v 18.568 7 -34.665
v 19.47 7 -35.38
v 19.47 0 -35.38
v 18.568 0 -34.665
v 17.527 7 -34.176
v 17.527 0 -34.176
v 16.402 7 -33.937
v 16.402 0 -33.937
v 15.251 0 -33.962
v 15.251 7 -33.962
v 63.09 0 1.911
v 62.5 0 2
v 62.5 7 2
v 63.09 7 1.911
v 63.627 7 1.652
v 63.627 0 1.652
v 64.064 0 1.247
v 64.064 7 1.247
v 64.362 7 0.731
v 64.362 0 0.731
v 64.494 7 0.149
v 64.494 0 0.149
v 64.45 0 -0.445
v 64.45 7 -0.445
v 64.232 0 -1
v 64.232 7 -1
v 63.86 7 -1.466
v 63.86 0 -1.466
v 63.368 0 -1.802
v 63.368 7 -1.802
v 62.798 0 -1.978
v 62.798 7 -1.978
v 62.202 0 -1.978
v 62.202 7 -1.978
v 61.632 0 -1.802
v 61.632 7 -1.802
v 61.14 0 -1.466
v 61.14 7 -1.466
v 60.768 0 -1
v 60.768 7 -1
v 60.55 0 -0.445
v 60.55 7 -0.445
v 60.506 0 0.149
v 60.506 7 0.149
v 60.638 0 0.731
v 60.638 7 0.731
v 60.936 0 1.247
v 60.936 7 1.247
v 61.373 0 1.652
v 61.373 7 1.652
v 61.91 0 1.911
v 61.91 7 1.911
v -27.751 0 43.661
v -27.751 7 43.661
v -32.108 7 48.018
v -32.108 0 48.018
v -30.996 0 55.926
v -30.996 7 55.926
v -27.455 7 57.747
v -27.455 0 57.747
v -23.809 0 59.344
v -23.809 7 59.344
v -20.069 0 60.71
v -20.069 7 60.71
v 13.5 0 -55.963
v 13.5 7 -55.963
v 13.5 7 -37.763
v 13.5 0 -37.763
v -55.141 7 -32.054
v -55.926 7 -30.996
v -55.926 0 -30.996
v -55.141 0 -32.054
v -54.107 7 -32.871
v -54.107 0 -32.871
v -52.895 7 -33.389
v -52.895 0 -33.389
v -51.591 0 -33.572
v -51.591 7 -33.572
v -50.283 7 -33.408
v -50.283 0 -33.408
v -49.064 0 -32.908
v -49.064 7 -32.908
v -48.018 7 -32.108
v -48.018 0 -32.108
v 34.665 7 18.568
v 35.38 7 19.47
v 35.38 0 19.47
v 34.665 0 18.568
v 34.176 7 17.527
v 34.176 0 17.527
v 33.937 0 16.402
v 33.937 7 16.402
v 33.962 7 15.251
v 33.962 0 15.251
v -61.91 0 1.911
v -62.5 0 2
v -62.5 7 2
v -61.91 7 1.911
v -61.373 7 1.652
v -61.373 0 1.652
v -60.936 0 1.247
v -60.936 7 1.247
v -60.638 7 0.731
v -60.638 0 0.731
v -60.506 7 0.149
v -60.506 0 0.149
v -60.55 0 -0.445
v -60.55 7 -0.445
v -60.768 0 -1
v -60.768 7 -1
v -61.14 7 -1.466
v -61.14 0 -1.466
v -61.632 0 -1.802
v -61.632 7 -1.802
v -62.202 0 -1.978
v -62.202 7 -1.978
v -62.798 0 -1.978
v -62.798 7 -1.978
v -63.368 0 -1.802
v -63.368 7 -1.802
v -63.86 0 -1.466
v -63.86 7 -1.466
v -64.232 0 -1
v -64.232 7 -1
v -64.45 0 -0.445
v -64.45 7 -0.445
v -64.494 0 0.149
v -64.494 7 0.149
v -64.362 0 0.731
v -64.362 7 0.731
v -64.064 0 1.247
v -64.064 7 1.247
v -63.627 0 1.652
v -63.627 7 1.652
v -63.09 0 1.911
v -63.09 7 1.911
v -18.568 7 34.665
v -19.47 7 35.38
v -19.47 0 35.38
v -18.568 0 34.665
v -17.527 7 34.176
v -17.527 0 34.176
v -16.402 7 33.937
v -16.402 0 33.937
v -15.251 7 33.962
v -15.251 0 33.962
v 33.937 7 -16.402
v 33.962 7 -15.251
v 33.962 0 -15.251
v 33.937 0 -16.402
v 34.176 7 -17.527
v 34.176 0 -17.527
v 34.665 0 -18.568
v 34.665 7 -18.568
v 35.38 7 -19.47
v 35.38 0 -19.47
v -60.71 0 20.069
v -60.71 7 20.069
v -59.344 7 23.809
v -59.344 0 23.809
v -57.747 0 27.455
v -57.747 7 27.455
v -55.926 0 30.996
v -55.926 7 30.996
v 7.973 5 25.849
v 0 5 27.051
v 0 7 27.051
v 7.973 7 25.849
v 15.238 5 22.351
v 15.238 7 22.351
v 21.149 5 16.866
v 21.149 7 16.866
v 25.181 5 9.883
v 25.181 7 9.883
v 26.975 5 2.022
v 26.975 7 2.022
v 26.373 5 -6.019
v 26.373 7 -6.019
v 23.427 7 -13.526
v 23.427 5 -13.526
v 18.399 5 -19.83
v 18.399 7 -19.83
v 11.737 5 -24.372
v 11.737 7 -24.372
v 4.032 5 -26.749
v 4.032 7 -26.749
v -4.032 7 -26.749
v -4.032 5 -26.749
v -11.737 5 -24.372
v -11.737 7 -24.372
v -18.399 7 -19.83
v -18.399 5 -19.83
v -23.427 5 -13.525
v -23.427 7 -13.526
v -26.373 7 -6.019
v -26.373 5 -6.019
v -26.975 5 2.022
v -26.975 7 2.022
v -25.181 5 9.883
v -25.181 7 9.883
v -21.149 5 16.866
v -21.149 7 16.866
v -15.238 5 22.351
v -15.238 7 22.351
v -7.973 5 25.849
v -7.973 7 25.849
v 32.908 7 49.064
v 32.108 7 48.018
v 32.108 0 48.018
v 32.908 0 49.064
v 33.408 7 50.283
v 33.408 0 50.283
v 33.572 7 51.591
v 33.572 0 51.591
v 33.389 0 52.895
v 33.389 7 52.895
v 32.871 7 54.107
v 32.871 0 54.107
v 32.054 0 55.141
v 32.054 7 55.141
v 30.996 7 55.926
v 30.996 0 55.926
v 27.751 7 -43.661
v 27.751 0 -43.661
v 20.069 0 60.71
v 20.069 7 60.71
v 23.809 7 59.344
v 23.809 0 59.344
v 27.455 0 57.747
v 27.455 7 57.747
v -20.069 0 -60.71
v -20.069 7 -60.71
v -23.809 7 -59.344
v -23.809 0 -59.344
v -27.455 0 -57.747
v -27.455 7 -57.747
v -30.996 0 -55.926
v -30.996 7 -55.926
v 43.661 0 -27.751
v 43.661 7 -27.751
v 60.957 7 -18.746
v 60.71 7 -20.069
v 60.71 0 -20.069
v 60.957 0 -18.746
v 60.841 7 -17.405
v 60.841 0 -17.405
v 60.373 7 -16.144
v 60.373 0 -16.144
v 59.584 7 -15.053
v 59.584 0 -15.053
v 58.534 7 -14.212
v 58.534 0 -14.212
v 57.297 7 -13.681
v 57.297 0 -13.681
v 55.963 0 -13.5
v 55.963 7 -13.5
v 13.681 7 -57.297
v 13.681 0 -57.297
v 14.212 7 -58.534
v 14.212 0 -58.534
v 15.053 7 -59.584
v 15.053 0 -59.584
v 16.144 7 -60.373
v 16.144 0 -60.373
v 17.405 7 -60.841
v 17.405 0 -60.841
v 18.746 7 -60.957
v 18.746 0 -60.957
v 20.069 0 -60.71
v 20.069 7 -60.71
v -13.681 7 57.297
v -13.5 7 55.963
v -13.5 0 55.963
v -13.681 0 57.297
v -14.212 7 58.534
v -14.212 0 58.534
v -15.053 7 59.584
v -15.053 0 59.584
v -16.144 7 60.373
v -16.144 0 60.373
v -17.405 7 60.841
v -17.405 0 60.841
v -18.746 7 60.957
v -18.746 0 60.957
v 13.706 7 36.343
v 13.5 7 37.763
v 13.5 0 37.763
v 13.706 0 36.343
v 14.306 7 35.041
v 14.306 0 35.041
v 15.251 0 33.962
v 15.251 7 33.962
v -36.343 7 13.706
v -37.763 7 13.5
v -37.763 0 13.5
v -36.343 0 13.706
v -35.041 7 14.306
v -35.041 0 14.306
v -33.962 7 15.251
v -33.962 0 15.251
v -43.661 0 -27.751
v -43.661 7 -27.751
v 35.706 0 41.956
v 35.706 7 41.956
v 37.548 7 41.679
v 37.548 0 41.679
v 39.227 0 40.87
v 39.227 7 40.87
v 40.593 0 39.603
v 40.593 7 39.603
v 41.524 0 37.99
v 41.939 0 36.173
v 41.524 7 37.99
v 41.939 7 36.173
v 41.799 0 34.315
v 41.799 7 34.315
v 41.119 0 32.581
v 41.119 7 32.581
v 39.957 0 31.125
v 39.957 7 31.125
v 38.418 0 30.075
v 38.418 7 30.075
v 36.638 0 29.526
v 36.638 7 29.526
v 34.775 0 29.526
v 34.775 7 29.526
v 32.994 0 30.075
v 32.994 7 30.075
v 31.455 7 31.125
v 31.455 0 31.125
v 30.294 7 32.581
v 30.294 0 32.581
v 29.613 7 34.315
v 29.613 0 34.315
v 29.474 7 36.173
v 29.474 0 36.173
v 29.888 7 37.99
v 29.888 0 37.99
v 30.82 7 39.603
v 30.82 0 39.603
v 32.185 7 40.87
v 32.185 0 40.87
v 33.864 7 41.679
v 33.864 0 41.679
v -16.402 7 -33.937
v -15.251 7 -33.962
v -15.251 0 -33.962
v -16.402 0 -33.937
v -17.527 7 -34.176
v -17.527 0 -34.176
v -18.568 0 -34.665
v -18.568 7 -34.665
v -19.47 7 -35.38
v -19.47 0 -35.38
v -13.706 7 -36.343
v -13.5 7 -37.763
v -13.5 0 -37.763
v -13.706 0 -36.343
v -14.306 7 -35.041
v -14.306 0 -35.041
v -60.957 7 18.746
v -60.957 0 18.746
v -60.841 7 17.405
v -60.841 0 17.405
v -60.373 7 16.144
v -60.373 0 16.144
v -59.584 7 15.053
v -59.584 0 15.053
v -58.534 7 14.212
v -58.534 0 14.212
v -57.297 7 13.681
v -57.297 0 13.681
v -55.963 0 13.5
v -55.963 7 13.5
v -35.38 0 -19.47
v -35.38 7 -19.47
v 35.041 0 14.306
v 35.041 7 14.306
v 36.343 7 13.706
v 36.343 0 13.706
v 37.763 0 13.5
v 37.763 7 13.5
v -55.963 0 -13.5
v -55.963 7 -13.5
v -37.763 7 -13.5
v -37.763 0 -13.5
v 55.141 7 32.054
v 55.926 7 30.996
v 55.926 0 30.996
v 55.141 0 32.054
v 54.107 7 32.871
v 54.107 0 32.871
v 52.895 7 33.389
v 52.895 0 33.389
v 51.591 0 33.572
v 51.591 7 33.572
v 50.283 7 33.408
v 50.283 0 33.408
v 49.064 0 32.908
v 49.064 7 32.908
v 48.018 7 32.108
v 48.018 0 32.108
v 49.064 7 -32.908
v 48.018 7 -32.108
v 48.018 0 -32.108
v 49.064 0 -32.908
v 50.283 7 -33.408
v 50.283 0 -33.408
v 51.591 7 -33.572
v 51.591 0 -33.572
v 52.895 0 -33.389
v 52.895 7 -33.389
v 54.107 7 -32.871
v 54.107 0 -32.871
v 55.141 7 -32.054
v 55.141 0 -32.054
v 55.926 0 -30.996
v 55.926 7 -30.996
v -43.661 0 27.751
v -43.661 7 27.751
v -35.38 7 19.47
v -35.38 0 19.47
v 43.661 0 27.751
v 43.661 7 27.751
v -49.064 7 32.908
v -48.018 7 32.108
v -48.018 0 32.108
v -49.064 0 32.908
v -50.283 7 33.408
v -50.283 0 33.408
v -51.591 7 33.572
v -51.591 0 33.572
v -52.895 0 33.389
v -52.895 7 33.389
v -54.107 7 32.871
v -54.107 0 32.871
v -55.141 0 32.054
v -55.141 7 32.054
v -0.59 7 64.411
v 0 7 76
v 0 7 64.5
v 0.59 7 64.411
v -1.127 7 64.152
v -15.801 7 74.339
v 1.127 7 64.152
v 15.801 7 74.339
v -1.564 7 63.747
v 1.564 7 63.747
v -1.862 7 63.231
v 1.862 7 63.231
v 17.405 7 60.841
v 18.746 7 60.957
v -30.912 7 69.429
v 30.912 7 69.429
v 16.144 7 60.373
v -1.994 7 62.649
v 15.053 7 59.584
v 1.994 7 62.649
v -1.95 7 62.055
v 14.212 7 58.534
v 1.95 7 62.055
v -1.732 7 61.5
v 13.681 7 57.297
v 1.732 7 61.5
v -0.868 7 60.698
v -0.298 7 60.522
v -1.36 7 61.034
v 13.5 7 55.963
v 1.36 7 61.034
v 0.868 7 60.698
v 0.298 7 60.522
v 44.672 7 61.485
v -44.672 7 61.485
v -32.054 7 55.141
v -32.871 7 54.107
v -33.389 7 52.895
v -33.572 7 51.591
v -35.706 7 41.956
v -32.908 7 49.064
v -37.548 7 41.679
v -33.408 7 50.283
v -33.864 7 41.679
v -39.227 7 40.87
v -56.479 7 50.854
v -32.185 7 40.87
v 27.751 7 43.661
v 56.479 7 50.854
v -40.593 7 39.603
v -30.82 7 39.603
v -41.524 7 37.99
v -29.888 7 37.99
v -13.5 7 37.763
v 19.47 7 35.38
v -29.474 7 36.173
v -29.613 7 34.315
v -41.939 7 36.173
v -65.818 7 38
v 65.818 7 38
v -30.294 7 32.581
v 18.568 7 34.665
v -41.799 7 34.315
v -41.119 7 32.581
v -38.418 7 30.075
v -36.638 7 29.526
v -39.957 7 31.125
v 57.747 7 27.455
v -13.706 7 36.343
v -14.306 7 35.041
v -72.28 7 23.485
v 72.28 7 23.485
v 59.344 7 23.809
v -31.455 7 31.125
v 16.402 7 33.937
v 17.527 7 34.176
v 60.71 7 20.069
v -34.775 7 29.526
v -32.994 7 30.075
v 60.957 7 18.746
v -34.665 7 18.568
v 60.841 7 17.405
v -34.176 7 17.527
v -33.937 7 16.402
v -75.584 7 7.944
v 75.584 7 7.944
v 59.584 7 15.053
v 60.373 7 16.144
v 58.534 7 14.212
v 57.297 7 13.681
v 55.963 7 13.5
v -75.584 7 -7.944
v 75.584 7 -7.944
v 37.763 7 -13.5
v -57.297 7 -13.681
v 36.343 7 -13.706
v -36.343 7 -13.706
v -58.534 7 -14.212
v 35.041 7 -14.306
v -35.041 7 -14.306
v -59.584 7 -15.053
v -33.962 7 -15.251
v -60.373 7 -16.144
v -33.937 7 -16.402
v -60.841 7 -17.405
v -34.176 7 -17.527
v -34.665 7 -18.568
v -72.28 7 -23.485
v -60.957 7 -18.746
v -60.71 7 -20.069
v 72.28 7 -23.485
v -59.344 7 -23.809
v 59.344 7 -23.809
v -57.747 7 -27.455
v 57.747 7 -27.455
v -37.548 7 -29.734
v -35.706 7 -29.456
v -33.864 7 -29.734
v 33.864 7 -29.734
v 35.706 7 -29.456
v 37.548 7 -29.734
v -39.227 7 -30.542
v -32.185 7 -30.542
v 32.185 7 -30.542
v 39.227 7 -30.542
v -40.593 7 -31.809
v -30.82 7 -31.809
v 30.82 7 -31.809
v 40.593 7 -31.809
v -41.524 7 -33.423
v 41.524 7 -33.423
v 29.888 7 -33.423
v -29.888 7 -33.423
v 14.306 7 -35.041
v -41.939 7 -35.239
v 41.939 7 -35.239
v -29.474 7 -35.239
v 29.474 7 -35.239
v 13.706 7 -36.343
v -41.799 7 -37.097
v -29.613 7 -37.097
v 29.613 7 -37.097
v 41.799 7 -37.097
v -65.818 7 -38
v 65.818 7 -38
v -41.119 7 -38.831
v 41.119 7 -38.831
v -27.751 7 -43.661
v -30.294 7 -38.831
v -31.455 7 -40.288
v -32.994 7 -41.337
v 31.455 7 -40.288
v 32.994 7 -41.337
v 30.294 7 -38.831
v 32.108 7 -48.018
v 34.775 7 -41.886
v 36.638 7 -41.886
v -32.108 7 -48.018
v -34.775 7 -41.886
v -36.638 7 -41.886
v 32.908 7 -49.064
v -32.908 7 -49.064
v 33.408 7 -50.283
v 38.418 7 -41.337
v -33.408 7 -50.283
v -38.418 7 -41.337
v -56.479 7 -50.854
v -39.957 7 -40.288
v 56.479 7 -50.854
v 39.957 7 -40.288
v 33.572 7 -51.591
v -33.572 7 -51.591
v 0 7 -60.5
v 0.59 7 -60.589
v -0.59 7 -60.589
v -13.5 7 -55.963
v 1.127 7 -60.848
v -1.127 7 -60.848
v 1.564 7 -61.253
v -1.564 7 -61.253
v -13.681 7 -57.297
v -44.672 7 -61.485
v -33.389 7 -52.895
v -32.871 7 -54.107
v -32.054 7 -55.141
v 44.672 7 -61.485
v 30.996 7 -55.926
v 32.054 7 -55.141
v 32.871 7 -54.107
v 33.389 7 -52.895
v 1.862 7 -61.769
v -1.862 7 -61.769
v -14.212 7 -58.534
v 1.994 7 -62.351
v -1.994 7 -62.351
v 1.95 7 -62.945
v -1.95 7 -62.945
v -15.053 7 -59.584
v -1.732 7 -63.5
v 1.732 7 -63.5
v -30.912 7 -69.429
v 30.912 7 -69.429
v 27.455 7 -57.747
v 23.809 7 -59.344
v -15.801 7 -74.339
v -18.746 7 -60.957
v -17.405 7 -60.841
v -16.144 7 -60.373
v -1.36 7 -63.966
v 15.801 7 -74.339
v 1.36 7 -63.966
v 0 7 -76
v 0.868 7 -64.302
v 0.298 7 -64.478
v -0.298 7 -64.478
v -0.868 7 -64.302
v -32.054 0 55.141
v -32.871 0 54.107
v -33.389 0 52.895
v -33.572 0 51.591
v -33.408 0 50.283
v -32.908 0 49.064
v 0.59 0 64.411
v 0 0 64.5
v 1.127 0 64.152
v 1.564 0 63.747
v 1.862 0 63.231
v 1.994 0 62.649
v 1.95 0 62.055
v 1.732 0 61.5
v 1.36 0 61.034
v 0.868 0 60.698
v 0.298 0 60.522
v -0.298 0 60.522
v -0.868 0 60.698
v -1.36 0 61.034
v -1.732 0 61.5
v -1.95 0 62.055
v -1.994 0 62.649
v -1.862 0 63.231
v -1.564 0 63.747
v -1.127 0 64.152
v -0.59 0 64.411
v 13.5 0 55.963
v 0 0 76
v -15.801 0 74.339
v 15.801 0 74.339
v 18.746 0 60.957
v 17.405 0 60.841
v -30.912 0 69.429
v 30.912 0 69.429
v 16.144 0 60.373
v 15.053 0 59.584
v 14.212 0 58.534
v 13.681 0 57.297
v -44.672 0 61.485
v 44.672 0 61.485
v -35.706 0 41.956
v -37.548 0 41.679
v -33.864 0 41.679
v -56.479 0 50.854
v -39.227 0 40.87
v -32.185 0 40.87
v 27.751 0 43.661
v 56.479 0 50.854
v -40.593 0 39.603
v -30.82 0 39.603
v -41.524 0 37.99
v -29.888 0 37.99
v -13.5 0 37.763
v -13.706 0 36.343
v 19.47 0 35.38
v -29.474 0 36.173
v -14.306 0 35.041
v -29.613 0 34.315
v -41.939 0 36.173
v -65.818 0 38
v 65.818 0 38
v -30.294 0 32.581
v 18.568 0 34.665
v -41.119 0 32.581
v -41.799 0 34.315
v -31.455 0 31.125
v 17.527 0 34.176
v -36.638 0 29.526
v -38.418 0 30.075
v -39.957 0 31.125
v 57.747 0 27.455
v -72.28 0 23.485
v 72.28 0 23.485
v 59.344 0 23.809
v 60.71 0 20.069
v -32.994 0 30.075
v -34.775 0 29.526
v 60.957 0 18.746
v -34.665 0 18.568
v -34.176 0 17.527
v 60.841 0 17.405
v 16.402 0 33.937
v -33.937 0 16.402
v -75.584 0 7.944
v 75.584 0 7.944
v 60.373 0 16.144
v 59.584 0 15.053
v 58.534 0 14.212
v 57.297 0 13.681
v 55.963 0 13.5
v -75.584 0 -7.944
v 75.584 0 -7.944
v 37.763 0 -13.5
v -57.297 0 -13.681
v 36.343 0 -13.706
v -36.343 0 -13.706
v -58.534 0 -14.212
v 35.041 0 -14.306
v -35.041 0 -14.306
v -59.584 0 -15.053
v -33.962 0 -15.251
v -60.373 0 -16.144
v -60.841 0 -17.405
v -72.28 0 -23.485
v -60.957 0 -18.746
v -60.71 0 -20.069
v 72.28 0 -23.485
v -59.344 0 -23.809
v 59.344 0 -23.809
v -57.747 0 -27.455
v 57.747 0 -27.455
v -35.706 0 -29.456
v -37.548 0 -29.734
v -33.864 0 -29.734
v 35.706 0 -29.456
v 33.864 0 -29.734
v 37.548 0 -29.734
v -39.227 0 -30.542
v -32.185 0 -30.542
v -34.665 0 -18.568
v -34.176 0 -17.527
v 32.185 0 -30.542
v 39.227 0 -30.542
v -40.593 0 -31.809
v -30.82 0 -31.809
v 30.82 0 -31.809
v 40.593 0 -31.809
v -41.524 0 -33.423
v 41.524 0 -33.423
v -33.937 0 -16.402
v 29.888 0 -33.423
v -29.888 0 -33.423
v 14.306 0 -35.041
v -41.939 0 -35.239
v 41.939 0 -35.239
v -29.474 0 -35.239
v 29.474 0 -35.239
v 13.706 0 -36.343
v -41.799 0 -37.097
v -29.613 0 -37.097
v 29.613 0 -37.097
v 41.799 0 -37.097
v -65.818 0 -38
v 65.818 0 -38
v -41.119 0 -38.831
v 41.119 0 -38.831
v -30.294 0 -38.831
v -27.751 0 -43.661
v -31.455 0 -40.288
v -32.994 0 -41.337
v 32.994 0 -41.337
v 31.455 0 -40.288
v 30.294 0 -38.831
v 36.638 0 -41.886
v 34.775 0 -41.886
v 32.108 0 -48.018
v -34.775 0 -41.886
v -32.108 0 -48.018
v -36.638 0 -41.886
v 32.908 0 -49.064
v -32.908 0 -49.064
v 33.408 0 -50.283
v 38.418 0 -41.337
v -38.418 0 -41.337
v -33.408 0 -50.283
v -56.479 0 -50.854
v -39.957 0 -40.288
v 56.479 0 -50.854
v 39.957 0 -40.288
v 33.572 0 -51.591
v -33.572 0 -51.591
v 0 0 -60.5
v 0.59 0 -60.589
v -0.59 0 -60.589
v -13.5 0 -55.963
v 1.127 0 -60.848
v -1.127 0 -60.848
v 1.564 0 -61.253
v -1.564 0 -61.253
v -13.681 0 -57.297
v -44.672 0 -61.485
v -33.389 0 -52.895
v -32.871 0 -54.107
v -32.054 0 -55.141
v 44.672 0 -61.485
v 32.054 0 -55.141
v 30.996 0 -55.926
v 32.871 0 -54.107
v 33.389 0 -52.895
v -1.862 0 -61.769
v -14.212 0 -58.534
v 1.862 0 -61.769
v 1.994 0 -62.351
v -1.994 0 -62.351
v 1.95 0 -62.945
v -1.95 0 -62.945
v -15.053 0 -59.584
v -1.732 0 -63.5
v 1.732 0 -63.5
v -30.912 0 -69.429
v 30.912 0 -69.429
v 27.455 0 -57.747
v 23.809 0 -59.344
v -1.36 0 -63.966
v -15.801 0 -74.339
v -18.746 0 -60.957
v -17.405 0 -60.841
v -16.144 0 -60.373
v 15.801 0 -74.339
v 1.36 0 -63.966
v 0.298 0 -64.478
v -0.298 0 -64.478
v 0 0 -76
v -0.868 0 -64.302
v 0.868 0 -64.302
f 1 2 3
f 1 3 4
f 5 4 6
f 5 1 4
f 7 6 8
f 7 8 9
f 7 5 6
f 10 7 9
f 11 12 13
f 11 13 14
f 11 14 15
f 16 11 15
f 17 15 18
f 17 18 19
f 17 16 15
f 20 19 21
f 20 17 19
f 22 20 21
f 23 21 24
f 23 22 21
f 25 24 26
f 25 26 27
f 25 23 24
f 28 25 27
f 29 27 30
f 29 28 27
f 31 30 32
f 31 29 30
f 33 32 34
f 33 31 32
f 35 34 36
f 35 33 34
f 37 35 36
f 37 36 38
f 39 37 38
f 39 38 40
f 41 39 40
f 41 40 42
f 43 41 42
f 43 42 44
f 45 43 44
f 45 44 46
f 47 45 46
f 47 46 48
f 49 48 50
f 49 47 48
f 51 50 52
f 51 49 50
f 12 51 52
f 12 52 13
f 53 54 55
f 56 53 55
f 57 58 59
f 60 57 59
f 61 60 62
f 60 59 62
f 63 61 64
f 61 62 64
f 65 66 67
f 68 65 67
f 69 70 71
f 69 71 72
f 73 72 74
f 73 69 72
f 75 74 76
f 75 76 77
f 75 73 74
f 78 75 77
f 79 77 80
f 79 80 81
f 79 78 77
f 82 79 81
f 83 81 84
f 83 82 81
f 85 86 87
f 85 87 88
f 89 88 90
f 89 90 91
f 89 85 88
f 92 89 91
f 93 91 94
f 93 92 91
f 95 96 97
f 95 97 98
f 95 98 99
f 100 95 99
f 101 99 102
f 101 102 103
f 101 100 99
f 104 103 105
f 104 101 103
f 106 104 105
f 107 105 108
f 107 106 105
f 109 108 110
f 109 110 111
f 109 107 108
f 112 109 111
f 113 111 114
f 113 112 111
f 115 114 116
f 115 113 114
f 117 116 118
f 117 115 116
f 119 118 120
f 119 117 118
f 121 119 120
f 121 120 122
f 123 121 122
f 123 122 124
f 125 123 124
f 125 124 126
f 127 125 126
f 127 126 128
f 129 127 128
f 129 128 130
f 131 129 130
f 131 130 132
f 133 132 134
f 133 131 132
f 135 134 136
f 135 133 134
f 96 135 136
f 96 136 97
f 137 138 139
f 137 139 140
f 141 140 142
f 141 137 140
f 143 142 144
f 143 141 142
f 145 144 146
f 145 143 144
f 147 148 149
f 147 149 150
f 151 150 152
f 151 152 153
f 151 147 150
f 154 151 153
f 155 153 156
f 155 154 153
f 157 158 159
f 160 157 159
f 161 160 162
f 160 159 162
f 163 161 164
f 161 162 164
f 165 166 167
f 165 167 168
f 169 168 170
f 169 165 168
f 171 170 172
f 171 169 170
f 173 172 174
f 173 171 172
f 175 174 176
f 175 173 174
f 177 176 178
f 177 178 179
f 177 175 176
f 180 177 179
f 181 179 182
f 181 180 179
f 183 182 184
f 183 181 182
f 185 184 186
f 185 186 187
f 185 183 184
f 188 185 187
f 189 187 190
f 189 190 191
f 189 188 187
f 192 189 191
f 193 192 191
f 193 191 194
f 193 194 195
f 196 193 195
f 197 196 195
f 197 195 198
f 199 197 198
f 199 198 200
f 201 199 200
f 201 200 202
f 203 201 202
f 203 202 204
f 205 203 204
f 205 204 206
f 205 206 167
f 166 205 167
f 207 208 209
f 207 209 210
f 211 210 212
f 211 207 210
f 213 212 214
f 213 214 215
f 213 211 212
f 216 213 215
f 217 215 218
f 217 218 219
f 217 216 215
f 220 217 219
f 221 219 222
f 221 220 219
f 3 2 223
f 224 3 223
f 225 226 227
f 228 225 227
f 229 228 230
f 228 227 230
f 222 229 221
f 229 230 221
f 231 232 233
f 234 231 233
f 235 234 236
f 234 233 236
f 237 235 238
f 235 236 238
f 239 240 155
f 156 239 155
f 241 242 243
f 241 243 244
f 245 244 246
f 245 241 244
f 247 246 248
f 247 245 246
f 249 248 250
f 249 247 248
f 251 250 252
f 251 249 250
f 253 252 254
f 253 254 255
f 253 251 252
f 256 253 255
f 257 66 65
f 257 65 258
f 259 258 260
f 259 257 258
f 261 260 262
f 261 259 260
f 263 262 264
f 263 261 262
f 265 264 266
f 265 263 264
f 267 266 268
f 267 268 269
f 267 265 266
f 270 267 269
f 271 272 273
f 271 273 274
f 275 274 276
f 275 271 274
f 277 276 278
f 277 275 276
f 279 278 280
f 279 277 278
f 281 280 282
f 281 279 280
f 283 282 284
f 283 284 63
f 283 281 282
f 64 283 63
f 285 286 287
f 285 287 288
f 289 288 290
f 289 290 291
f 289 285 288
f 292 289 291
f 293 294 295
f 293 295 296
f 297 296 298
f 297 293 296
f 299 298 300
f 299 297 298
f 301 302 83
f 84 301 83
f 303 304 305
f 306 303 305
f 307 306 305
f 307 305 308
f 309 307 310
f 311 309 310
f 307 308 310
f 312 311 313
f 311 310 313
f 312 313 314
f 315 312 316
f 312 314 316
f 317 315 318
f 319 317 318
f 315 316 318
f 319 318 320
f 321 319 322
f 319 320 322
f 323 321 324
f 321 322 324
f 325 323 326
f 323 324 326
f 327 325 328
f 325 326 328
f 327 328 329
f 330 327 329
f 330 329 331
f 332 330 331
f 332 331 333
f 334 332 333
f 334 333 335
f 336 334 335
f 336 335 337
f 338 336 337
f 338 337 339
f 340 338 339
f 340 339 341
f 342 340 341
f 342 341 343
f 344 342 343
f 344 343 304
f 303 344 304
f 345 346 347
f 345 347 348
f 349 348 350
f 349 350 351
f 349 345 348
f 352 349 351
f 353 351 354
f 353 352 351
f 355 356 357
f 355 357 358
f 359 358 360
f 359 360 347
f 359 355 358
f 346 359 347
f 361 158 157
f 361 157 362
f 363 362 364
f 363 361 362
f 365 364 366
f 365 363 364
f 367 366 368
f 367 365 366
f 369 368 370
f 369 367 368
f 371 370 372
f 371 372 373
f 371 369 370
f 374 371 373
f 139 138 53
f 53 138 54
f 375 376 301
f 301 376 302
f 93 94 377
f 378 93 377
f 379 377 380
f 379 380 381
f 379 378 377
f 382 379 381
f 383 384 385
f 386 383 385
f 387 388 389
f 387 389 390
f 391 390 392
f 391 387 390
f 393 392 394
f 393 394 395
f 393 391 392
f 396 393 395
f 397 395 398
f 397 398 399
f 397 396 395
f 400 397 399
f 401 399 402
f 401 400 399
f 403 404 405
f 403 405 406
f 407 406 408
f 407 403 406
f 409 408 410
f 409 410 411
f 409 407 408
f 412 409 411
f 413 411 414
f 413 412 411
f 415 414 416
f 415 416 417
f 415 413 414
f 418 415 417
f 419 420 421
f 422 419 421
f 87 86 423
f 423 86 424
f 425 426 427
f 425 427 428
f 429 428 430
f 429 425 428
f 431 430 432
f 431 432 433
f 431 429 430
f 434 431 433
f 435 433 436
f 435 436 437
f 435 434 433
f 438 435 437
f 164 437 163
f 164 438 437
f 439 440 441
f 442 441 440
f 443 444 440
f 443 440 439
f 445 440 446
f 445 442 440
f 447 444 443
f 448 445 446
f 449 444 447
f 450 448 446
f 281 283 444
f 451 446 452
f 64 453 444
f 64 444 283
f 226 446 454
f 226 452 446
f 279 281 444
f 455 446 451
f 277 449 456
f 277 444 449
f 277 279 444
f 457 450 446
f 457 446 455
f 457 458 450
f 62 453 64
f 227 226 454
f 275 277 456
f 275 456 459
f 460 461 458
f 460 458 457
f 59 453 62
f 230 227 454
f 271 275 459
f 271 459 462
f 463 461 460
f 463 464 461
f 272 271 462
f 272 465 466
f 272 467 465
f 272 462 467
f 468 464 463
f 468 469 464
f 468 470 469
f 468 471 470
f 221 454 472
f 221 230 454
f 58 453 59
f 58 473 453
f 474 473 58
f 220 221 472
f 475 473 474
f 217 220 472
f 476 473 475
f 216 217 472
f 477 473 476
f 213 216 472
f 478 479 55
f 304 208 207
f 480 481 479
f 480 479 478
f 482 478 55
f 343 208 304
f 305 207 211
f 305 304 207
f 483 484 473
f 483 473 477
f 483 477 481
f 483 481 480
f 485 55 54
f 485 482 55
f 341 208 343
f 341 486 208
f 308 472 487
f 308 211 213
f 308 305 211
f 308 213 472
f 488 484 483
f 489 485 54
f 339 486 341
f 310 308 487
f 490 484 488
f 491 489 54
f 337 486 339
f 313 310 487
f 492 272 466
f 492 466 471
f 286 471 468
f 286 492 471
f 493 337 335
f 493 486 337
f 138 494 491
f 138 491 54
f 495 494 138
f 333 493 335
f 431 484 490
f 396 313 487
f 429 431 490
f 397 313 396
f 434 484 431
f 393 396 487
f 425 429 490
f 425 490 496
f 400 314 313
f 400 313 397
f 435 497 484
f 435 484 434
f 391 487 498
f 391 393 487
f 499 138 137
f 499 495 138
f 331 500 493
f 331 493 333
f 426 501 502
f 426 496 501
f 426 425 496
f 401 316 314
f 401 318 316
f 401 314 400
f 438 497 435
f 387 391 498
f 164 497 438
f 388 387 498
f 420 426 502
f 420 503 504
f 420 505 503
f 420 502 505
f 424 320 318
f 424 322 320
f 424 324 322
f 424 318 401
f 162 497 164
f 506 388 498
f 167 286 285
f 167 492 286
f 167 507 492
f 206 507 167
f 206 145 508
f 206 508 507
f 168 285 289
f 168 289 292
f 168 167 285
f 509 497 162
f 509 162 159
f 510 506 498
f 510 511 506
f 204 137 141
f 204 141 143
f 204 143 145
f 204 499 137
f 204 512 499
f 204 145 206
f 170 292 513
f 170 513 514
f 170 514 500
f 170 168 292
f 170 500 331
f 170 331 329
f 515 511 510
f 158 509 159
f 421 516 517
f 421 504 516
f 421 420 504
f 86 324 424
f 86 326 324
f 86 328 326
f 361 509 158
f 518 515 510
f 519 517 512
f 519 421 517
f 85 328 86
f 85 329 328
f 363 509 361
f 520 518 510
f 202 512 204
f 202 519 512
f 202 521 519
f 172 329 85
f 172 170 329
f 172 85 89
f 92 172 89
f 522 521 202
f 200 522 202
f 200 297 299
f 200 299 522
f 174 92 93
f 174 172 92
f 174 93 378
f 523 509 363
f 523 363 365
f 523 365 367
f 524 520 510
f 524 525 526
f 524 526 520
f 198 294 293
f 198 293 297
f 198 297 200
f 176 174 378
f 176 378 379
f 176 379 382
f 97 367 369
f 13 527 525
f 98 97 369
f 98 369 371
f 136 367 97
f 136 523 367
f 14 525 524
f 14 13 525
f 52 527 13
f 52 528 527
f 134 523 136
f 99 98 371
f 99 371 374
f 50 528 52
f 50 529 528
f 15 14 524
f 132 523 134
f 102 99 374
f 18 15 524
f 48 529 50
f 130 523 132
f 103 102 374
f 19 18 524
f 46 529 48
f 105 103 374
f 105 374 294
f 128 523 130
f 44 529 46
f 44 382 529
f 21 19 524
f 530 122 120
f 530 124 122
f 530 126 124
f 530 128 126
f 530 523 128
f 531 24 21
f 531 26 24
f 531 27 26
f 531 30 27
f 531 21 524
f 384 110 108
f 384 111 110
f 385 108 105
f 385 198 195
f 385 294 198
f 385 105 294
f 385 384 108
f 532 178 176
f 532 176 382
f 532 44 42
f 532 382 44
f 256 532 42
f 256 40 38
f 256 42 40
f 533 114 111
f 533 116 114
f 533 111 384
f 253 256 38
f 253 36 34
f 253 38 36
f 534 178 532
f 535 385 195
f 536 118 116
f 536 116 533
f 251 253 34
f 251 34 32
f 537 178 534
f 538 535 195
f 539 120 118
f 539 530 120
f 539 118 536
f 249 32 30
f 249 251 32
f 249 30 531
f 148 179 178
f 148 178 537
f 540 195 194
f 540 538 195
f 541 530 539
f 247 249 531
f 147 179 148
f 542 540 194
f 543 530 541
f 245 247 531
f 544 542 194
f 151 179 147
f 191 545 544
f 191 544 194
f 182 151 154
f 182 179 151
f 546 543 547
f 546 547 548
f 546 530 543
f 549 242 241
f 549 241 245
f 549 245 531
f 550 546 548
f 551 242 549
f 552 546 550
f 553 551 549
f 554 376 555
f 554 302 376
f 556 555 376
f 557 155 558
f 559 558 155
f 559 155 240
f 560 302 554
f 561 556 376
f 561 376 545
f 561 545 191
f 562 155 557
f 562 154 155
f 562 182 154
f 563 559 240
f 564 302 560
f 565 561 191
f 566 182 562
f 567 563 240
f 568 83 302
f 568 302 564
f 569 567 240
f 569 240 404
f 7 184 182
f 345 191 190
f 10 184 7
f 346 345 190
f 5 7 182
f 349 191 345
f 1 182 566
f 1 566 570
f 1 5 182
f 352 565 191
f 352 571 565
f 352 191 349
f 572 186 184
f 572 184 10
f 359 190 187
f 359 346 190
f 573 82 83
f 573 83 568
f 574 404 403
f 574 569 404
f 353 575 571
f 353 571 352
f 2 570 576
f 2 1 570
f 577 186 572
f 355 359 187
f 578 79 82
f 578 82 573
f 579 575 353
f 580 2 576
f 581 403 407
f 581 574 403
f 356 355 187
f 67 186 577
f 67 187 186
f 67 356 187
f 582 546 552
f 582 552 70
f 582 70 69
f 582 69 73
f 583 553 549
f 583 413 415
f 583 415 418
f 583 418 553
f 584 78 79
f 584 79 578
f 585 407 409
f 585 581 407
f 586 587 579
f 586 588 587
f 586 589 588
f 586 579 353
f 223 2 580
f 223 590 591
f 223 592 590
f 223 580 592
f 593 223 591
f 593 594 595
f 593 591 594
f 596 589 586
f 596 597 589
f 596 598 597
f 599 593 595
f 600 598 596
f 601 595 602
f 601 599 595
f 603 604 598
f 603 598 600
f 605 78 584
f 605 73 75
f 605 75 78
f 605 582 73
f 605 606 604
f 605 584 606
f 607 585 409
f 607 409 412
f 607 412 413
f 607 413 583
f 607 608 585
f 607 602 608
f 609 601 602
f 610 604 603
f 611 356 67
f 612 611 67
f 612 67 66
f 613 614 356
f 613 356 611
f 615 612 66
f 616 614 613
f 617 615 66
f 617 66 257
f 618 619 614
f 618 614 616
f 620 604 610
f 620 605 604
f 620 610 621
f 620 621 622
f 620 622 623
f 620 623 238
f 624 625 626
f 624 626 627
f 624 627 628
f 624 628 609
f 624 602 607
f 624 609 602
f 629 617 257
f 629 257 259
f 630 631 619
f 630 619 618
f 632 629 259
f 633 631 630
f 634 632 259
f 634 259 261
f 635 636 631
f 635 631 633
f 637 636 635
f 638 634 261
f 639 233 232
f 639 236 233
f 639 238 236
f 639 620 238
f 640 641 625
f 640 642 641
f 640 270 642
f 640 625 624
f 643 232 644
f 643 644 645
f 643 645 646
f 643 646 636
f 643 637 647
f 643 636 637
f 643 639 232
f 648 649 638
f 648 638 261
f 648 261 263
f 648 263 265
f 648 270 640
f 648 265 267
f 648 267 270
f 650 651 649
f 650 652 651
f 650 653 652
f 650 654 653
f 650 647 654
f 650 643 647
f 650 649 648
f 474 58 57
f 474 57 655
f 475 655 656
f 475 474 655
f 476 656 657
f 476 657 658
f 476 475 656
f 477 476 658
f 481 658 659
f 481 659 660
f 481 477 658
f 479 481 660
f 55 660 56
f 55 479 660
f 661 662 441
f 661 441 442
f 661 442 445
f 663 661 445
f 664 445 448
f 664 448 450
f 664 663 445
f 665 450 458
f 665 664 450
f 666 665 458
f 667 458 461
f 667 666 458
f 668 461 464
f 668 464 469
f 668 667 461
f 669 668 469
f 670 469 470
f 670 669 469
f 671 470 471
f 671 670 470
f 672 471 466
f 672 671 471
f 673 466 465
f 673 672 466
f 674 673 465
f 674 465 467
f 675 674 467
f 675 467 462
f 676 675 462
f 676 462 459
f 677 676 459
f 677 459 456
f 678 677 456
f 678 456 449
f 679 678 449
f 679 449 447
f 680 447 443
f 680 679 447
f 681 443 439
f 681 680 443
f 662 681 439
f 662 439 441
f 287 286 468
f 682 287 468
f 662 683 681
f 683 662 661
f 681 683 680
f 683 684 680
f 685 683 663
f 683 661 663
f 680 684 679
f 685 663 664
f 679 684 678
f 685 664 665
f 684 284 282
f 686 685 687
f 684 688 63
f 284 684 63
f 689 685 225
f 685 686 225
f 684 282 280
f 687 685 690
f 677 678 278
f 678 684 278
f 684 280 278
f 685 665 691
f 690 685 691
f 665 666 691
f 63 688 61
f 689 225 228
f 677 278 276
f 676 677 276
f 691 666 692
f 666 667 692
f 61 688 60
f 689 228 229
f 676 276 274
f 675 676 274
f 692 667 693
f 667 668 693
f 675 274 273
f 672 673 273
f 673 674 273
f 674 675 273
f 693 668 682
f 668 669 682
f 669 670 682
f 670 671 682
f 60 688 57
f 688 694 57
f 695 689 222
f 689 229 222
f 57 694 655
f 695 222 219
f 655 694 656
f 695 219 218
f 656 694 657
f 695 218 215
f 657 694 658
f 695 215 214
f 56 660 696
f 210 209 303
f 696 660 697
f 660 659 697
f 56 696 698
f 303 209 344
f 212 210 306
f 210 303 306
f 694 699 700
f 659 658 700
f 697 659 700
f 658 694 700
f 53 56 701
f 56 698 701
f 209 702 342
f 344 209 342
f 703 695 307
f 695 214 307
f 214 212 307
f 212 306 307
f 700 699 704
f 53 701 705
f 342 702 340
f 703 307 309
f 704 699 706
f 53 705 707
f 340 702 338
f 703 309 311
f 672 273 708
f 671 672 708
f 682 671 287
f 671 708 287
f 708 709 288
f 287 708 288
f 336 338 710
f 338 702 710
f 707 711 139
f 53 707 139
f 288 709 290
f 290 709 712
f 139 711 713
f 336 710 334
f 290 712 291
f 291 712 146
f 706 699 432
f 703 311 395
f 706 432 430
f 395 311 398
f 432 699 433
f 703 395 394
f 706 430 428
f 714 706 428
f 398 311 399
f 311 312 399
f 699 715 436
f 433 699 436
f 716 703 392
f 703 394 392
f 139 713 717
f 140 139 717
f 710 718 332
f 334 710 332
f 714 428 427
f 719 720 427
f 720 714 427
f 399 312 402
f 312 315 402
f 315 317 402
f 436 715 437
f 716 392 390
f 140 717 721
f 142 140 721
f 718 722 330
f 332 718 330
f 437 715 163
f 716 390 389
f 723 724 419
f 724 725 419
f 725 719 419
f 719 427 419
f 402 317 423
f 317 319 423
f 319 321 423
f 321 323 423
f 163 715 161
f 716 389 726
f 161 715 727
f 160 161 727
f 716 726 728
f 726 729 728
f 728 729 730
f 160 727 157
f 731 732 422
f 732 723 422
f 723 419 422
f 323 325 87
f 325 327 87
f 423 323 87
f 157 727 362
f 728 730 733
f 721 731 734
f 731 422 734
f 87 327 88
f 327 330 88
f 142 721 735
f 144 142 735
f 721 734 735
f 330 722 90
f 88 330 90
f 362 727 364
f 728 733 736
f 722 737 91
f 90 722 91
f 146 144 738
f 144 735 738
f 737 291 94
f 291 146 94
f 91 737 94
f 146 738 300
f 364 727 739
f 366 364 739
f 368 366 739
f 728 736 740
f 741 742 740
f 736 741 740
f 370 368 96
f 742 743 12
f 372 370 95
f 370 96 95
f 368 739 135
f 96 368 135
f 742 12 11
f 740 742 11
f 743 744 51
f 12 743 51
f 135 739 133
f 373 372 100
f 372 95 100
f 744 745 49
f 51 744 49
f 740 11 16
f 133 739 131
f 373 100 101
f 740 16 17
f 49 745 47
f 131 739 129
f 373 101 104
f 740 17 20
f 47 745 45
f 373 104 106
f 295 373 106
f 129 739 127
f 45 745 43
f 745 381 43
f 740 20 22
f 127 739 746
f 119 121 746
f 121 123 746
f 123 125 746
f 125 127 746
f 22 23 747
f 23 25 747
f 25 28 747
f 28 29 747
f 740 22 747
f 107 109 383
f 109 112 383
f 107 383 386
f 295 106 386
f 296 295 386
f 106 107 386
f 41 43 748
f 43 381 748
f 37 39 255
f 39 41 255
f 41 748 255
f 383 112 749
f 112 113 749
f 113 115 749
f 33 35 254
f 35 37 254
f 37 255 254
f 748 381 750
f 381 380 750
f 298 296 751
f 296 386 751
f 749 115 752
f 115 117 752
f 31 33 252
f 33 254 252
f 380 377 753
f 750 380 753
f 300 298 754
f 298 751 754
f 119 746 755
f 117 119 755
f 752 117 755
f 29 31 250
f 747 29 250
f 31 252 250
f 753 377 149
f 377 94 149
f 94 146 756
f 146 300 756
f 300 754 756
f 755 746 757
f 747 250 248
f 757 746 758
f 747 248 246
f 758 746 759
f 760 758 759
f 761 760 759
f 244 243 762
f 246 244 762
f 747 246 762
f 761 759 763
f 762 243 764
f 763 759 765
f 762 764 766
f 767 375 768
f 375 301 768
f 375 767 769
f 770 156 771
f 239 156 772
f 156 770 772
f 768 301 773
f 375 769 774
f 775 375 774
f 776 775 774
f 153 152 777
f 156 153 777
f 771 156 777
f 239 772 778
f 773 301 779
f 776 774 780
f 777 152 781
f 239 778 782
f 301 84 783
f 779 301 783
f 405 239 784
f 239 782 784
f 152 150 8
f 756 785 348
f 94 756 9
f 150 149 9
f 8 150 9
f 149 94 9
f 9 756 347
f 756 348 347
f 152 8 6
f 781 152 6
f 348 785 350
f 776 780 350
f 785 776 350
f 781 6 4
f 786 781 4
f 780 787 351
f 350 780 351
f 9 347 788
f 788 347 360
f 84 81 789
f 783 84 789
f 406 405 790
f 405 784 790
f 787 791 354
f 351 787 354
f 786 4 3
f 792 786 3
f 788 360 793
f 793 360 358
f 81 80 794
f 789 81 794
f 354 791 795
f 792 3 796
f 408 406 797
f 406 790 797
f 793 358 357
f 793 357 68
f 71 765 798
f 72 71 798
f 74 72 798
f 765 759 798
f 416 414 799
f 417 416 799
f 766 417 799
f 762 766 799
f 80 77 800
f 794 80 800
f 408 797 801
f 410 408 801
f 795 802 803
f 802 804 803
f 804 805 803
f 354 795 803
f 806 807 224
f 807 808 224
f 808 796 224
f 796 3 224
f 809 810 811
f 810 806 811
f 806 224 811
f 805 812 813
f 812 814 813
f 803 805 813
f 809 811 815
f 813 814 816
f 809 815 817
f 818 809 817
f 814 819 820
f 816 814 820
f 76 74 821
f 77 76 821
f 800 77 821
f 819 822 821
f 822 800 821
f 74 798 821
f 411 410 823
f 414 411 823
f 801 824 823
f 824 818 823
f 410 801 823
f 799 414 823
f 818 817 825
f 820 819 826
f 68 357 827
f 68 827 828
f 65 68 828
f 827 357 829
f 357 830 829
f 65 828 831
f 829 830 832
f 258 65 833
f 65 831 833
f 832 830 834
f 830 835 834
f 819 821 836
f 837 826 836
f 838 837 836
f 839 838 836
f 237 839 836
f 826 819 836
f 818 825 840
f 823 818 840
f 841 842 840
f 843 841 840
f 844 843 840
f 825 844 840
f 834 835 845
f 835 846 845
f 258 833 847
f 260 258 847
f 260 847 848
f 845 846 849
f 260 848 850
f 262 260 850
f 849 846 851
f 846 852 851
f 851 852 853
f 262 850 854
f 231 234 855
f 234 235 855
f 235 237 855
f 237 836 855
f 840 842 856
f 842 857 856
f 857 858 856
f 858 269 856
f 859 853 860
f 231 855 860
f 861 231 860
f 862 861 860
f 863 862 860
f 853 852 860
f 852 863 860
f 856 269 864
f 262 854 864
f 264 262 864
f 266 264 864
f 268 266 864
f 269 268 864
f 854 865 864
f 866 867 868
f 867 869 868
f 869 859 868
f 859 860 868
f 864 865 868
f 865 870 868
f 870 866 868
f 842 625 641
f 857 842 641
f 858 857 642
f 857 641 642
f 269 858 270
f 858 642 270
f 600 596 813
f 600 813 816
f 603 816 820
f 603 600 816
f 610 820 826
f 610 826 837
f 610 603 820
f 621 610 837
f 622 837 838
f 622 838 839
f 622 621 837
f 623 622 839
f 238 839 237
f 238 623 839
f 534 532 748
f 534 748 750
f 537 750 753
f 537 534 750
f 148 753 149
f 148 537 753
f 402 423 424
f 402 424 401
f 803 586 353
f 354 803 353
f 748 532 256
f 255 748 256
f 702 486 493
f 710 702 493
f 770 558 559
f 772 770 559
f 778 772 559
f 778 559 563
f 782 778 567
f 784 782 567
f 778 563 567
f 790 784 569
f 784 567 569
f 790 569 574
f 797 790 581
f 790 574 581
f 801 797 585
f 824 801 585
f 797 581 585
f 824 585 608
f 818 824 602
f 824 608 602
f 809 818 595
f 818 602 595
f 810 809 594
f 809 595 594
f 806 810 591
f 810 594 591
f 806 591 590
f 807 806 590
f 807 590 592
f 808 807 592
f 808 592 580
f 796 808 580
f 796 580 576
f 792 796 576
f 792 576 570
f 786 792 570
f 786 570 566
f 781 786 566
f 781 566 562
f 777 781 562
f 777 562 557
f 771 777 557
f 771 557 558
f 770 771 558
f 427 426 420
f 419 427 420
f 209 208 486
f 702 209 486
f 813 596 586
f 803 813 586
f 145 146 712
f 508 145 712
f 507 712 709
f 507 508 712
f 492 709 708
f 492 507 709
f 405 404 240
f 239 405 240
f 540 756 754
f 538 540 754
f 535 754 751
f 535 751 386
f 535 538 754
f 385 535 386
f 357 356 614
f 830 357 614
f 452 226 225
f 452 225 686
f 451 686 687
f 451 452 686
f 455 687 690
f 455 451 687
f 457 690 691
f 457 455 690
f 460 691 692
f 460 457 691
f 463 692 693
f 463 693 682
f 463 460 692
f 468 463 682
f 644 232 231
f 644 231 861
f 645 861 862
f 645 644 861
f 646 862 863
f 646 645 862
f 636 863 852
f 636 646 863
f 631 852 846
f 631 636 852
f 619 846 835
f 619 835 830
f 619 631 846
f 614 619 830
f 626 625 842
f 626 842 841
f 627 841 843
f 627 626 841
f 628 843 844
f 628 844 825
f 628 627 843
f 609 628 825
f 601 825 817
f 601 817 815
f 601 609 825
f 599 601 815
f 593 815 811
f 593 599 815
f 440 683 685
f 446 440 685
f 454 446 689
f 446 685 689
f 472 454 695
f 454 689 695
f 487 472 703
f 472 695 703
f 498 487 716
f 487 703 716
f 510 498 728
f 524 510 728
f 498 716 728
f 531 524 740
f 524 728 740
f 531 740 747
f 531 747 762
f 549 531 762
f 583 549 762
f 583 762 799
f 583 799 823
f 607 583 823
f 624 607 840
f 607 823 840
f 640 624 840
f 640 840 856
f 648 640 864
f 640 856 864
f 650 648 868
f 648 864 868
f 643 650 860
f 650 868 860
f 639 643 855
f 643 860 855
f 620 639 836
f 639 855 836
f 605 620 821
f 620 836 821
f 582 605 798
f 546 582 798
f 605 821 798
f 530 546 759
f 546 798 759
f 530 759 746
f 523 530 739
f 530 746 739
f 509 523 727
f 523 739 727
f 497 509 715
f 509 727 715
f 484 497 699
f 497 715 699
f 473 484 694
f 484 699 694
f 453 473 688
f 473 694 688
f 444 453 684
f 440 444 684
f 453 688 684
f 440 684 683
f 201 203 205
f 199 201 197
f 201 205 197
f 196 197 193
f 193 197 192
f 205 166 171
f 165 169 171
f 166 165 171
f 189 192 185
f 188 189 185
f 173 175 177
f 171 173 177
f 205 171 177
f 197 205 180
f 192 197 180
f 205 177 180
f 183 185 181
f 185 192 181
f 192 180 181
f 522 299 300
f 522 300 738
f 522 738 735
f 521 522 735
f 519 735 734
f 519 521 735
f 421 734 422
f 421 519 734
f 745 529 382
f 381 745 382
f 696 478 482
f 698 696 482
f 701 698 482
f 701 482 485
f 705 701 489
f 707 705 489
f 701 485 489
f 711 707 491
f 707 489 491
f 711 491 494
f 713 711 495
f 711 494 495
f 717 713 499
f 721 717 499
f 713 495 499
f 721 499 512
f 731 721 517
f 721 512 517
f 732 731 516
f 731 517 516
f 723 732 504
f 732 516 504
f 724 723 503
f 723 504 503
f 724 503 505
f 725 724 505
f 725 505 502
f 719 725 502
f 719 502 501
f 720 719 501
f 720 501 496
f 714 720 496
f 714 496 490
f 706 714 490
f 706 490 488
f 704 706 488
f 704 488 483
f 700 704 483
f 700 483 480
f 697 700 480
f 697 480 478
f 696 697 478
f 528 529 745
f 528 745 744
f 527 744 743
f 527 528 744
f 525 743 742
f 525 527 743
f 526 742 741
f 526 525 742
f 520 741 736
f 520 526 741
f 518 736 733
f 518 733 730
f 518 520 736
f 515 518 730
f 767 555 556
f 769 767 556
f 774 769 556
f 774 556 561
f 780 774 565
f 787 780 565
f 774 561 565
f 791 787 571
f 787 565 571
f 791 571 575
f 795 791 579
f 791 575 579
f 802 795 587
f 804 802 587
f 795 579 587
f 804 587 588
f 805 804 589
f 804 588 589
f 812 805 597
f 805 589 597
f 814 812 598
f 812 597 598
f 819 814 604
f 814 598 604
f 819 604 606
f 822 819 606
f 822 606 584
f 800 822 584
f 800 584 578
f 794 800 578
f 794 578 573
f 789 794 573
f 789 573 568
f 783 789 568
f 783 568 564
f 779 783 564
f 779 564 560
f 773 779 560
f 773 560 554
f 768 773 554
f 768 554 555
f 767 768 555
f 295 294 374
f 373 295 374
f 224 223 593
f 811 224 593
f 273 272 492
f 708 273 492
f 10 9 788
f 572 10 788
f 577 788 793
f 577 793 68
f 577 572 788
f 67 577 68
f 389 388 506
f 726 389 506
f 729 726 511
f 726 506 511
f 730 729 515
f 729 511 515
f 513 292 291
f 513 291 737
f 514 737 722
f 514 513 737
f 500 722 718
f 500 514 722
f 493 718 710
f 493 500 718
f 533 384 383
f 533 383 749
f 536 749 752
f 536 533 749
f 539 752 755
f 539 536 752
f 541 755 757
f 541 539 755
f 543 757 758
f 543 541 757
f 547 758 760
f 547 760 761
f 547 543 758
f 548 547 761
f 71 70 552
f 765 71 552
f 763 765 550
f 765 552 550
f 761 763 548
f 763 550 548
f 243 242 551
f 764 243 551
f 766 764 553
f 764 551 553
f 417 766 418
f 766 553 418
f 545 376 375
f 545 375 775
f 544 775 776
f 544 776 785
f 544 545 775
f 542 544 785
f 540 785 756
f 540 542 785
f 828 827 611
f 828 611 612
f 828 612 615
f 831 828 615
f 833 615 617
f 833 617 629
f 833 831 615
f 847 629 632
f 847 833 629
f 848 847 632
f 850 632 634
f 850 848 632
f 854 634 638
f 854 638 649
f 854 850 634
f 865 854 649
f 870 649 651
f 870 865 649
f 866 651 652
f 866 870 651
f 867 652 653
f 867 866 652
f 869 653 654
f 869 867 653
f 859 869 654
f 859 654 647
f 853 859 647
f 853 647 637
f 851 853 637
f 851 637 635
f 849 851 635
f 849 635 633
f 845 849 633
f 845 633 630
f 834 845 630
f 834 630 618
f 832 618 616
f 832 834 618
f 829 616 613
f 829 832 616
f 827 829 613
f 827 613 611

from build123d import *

# Parameters (mm, degrees)
SKETCH1_R           = 76
SKETCH1_R_2         = 27.051
SKETCH1_R_3         = 2
BOSS_EXTRUDE1_DEPTH = 7
SKETCH3_R           = 27.051
BOSS_EXTRUDE2_DEPTH = 5
SKETCH4_R           = 6.25
CUT_EXTRUDE1_DEPTH  = 10
FILLET1_R           = 5


with BuildPart() as part:
    # Sketch1 → Boss-Extrude1 (new body)
    with BuildSketch(Plane(origin=(0, 0, 0), x_dir=(1, 0, 0), z_dir=(0, 1, 0))):
        with Locations(Location((0, 0, 0), (0, 0, 270))):
            Circle(SKETCH1_R)
        with Locations(Location((0, 0, 0), (0, 0, 270))):
            Circle(SKETCH1_R_2, mode=Mode.SUBTRACT)
        with Locations(Location((0, 62.5, 0), (0, 0, 270))):
            Circle(SKETCH1_R_3, mode=Mode.SUBTRACT)
        with Locations(Location((62.5, 0, 0), (0, 0, 270))):
            Circle(SKETCH1_R_3, mode=Mode.SUBTRACT)
        with Locations(Location((0, -62.5, 0), (0, 0, 270))):
            Circle(SKETCH1_R_3, mode=Mode.SUBTRACT)
        with Locations(Location((-62.5, 0, 0), (0, 0, 270))):
            Circle(SKETCH1_R_3, mode=Mode.SUBTRACT)
    extrude(amount=BOSS_EXTRUDE1_DEPTH)

    # Sketch3 → Boss-Extrude2 (add)
    with BuildSketch(Plane.XZ):
        with Locations(Location((0, 0, 0), (0, 0, 270))):
            Circle(SKETCH3_R)
    extrude(amount=-BOSS_EXTRUDE2_DEPTH)

    # Sketch4 → Cut-Extrude1 (cut)
    with BuildSketch(Plane(origin=(0, 7, 0), x_dir=(1, 0, 0), z_dir=(0, 1, 0))):
        with BuildLine():
            Line((27.751246841, -43.661149418), (17.007161012, -32.917063589))
            ThreePointArc((17.007161012, -32.917063589), (15.274204293, -33.756114768), (13.5, -34.504008477))
            Line((13.5, -34.504008477), (13.5, -62.5))
            ThreePointArc((13.5, -62.5), (25.524772494, -58.625813335), (36.553123822, -52.463026398))
            Line((36.553123822, -52.463026398), (27.751246841, -43.661149418))
        make_face()
        with BuildLine():
            Line((62.5, -13.5), (34.504008477, -13.5))
            ThreePointArc((34.504008477, -13.5), (33.756114768, -15.274204293), (32.917063589, -17.007161012))
            Line((32.917063589, -17.007161012), (43.66114941, -27.751246833))
            Line((43.66114941, -27.751246833), (52.463026398, -36.553123822))
            ThreePointArc((52.463026398, -36.553123822), (58.625813335, -25.524772494), (62.5, -13.5))
        make_face()
        with BuildLine():
            ThreePointArc((-13.5, -34.504008477), (-15.274204293, -33.756114768), (-17.007161012, -32.917063589))
            Line((-17.007161012, -32.917063589), (-27.751246874, -43.66114945))
            Line((-27.751246874, -43.66114945), (-36.553123822, -52.463026398))
            ThreePointArc((-36.553123822, -52.463026398), (-25.524772494, -58.625813335), (-13.5, -62.5))
            Line((-13.5, -62.5), (-13.5, -34.504008477))
        make_face()
        with BuildLine():
            ThreePointArc((-32.917063589, -17.007161012), (-33.756114768, -15.274204293), (-34.504008477, -13.5))
            Line((-34.504008477, -13.5), (-62.5, -13.5))
            ThreePointArc((-62.5, -13.5), (-58.625813335, -25.524772494), (-52.463026398, -36.553123822))
            Line((-52.463026398, -36.553123822), (-43.661149471, -27.751246894))
            Line((-43.661149471, -27.751246894), (-32.917063589, -17.007161012))
        make_face()
        with BuildLine():
            ThreePointArc((-34.504008477, 13.5), (-33.756114768, 15.274204293), (-32.917063589, 17.007161012))
            Line((-32.917063589, 17.007161012), (-43.66114943, 27.751246854))
            Line((-43.66114943, 27.751246854), (-52.463026398, 36.553123822))
            ThreePointArc((-52.463026398, 36.553123822), (-58.625813335, 25.524772494), (-62.5, 13.5))
            Line((-62.5, 13.5), (-34.504008477, 13.5))
        make_face()
        with BuildLine():
            ThreePointArc((-17.007161012, 32.917063589), (-15.274204293, 33.756114768), (-13.5, 34.504008477))
            Line((-13.5, 34.504008477), (-13.5, 62.5))
            ThreePointArc((-13.5, 62.5), (-25.524772494, 58.625813335), (-36.553123822, 52.463026398))
            Line((-36.553123822, 52.463026398), (-27.751246874, 43.66114945))
            Line((-27.751246874, 43.66114945), (-17.007161012, 32.917063589))
        make_face()
        with BuildLine():
            ThreePointArc((36.553123822, 52.463026398), (25.524772494, 58.625813335), (13.5, 62.5))
            Line((13.5, 62.5), (13.5, 34.504008477))
            ThreePointArc((13.5, 34.504008477), (15.274204293, 33.756114768), (17.007161012, 32.917063589))
            Line((17.007161012, 32.917063589), (27.751246906, 43.661149483))
            Line((27.751246906, 43.661149483), (36.553123822, 52.463026398))
        make_face()
        with BuildLine():
            ThreePointArc((62.5, 13.5), (58.625813335, 25.524772494), (52.463026398, 36.553123822))
            Line((52.463026398, 36.553123822), (43.66114945, 27.751246874))
            Line((43.66114945, 27.751246874), (32.917063589, 17.007161012))
            ThreePointArc((32.917063589, 17.007161012), (33.756114768, 15.274204293), (34.504008477, 13.5))
            Line((34.504008477, 13.5), (62.5, 13.5))
        make_face()
        with Locations(Location((35.706198162, 35.706198162, 0), (0, 0, 270))):
            Circle(SKETCH4_R)
        with Locations(Location((35.706198162, -35.706198162, 0), (0, 0, 270))):
            Circle(SKETCH4_R)
        with Locations(Location((-35.706198162, -35.706198162, 0), (0, 0, 270))):
            Circle(SKETCH4_R)
        with Locations(Location((-35.706198162, 35.706198162, 0), (0, 0, 270))):
            Circle(SKETCH4_R)
    extrude(amount=-CUT_EXTRUDE1_DEPTH, mode=Mode.SUBTRACT)

    # Fillet1
    # the kernel refuses this fillet: 5 mm, written as the material it adds along each edge
    with BuildSketch(Plane(origin=(34.504008477, 7, 13.5), x_dir=(1, 0, 0), z_dir=(0, -1, 0)), Plane(origin=(13.5, 7, -34.504008477), x_dir=(0, 0, -1), z_dir=(0, -1, 0)), Plane(origin=(-34.504008477, 7, -13.5), x_dir=(-1, 0, 0), z_dir=(0, -1, 0)), Plane(origin=(-13.5, 7, 34.504008477), x_dir=(0, 0, 1), z_dir=(0, -1, 0))) as fillet1_piece_1:
        with BuildLine():
            CenterArc((3.258891319, 5), FILLET1_R, 206.100178987, 63.899821013)
            ThreePointArc((-1.231239688, 2.800290124), (-0.586707725, 1.412857227), (0, 0))
            Line((0, 0), (3.258891319, 0))
        make_face()
    extrude(amount=7)
    with BuildSketch(Plane(origin=(62.5, 7, 13.5), x_dir=(-1, 0, 0), z_dir=(0, -1, 0))) as fillet1_piece_2:
        with BuildLine():
            CenterArc((6.537189081, -5), FILLET1_R, 90, 108.2926811)
            ThreePointArc((1.789861186, -6.569355874), (0.807426008, -3.308519097), (0, 0))
            Line((0, 0), (6.537189081, 0))
        make_face()
    extrude(amount=7)
    with BuildSketch(Plane(origin=(52.463026398, 7, 36.553123822), x_dir=(-0.7071067811865521, 0, -0.707106781186543), z_dir=(0, -1, 0)), Plane(origin=(-36.553123822, 7, 52.463026398), x_dir=(0.7071067811865515, 0, -0.7071067811865436), z_dir=(0, -1, 0))) as fillet1_piece_3:
        with BuildLine():
            CenterArc((6.286852353, 5), FILLET1_R, 163.996405934, 106.003594066)
            ThreePointArc((1.480630334, 6.378488268), (0.658610883, 3.208210045), (0, 0))
            Line((0, 0), (6.286852353, 0))
        make_face()
    extrude(amount=7)
    with BuildSketch(Plane(origin=(32.917063589, 7, 17.007161012), x_dir=(0.4193809358930841, 0, -0.907810349472532), z_dir=(0, -1, 0)), Plane(origin=(17.007161012, 7, -32.917063589), x_dir=(-0.9078103494725283, 0, -0.41938093589309267), z_dir=(0, -1, 0)), Plane(origin=(-32.917063589, 7, -17.007161012), x_dir=(-0.4193809358930852, 0, 0.9078103494725317), z_dir=(0, -1, 0))) as fillet1_piece_4:
        with BuildLine():
            CenterArc((3.489548398, 4.995132399), FILLET1_R, 200.204490443, 67.267112024)
            Line((-1.202781391, 3.268273647), (0, 0))
            ThreePointArc((0, 0), (1.634487847, 0.036069898), (3.268975694, 0))
        make_face()
    extrude(amount=7)
    with BuildSketch(Plane(origin=(32.917063589, 7, -17.007161012), x_dir=(0.7071067811865526, 0, -0.7071067811865425), z_dir=(0, -1, 0)), Plane(origin=(-17.007161012, 7, -32.917063589), x_dir=(-0.7071067811865506, 0, -0.7071067811865445), z_dir=(0, -1, 0)), Plane(origin=(-32.917063589, 7, 17.007161012), x_dir=(-0.7071067811865506, 0, 0.7071067811865445), z_dir=(0, -1, 0)), Plane(origin=(17.007161012, 7, 32.917063589), x_dir=(0.7071067811865501, 0, 0.707106781186545), z_dir=(0, -1, 0))) as fillet1_piece_5:
        with BuildLine():
            CenterArc((3.482570273, 5), FILLET1_R, 202.732887976, 67.267112024)
            ThreePointArc((-1.129011858, 3.067822406), (-0.530655558, 1.546368727), (0, 0))
            Line((0, 0), (3.482570273, 0))
        make_face()
    extrude(amount=7)
    with BuildSketch(Plane(origin=(34.504008477, 7, -13.5), x_dir=(1, 0, 0), z_dir=(0, -1, 0))) as fillet1_piece_6:
        with BuildLine():
            CenterArc((3.258891319, -5), FILLET1_R, 90, 63.899821013)
            ThreePointArc((-1.231239688, -2.800290124), (-0.586707725, -1.412857227), (0, 0))
            Line((0, 0), (3.258891319, 0))
        make_face()
    extrude(amount=7)
    with BuildSketch(Plane(origin=(62.5, 7, -13.5), x_dir=(-1, 0, 0), z_dir=(0, -1, 0)), Plane(origin=(-13.5, 7, -62.5), x_dir=(0, 0, 1), z_dir=(0, -1, 0)), Plane(origin=(-62.5, 7, 13.5), x_dir=(1, 0, 0), z_dir=(0, -1, 0)), Plane(origin=(13.5, 7, 62.5), x_dir=(0, 0, -1), z_dir=(0, -1, 0))) as fillet1_piece_7:
        with BuildLine():
            CenterArc((6.537189081, 5), FILLET1_R, 161.7073189, 108.2926811)
            ThreePointArc((1.789861186, 6.569355874), (0.807426008, 3.308519097), (0, 0))
            Line((0, 0), (6.537189081, 0))
        make_face()
    extrude(amount=7)
    with BuildSketch(Plane(origin=(52.463026398, 7, -36.553123822), x_dir=(0.5289042688396526, 0, 0.848681491728901), z_dir=(0, -1, 0))) as fillet1_piece_8:
        with BuildLine():
            CenterArc((6.292063112, 4.993441128), FILLET1_R, 166.931450544, 106.003594066)
            Line((1.421561948, 6.124024341), (0, 0))
            ThreePointArc((0, 0), (3.274041034, -0.08387667), (6.548082068, 0))
        make_face()
    extrude(amount=7)
    with BuildSketch(Plane(origin=(36.553123822, 7, -52.463026398), x_dir=(-0.8486814917288963, 0, -0.52890426883966), z_dir=(0, -1, 0)), Plane(origin=(-52.463026398, 7, -36.553123822), x_dir=(-0.5289042688396536, 0, 0.8486814917289003), z_dir=(0, -1, 0))) as fillet1_piece_9:
        with BuildLine():
            CenterArc((6.292063112, -4.993441128), FILLET1_R, 87.06495539, 106.003594066)
            Line((1.421561948, -6.124024341), (0, 0))
            ThreePointArc((0, 0), (3.274041034, 0.08387667), (6.548082068, 0))
        make_face()
    extrude(amount=7)
    with BuildSketch(Plane(origin=(13.5, 7, -62.5), x_dir=(0.9648302017860143, 0, 0.26287388938720957), z_dir=(0, -1, 0)), Plane(origin=(-62.5, 7, -13.5), x_dir=(0.2628738893872084, 0, -0.9648302017860146), z_dir=(0, -1, 0)), Plane(origin=(-13.5, 7, 62.5), x_dir=(-0.9648302017860145, 0, -0.26287388938720885), z_dir=(0, -1, 0))) as fillet1_piece_10:
        with BuildLine():
            CenterArc((6.542607328, 4.992908013), FILLET1_R, 164.759342849, 108.2926811)
            Line((1.718456319, 6.30727746), (0, 0))
            ThreePointArc((0, 0), (3.404410363, -0.090694285), (6.808820725, 0))
        make_face()
    extrude(amount=7)
    with BuildSketch(Plane(origin=(-36.553123822, 7, -52.463026398), x_dir=(0.707106781186552, 0, 0.7071067811865429), z_dir=(0, -1, 0)), Plane(origin=(-52.463026398, 7, 36.553123822), x_dir=(0.7071067811865515, 0, -0.7071067811865436), z_dir=(0, -1, 0)), Plane(origin=(36.553123822, 7, 52.463026398), x_dir=(-0.7071067811865527, 0, -0.7071067811865425), z_dir=(0, -1, 0))) as fillet1_piece_11:
        with BuildLine():
            CenterArc((6.286852353, -5), FILLET1_R, 90, 106.003594066)
            ThreePointArc((1.480630334, -6.378488268), (0.658610883, -3.208210045), (0, 0))
            Line((0, 0), (6.286852353, 0))
        make_face()
    extrude(amount=7)
    with BuildSketch(Plane(origin=(-13.5, 7, -34.504008477), x_dir=(-0.9154220062230544, 0, 0.4024954043496127), z_dir=(0, -1, 0)), Plane(origin=(-34.504008477, 7, 13.5), x_dir=(0.4024954043496181, 0, 0.915422006223052), z_dir=(0, -1, 0)), Plane(origin=(13.5, 7, 34.504008477), x_dir=(0.915422006223051, 0, -0.40249540434962), z_dir=(0, -1, 0))) as fillet1_piece_12:
        with BuildLine():
            CenterArc((3.265421252, 4.995737851), FILLET1_R, 203.734271223, 63.899821013)
            Line((-1.311688779, 2.983260829), (0, 0))
            ThreePointArc((0, 0), (1.52950776, 0.031583378), (3.059015519, 0))
        make_face()
    extrude(amount=7)
    with BuildSketch(Plane(origin=(-17.007161012, 7, 32.917063589), x_dir=(-0.7071067811865496, 0, 0.7071067811865455), z_dir=(0, -1, 0))) as fillet1_piece_13:
        with BuildLine():
            CenterArc((3.482570273, -5), FILLET1_R, 90, 67.267112024)
            ThreePointArc((-1.129011858, -3.067822406), (-0.530655558, -1.546368727), (0, 0))
            Line((0, 0), (3.482570273, 0))
        make_face()
    extrude(amount=7)


solid = part.part
